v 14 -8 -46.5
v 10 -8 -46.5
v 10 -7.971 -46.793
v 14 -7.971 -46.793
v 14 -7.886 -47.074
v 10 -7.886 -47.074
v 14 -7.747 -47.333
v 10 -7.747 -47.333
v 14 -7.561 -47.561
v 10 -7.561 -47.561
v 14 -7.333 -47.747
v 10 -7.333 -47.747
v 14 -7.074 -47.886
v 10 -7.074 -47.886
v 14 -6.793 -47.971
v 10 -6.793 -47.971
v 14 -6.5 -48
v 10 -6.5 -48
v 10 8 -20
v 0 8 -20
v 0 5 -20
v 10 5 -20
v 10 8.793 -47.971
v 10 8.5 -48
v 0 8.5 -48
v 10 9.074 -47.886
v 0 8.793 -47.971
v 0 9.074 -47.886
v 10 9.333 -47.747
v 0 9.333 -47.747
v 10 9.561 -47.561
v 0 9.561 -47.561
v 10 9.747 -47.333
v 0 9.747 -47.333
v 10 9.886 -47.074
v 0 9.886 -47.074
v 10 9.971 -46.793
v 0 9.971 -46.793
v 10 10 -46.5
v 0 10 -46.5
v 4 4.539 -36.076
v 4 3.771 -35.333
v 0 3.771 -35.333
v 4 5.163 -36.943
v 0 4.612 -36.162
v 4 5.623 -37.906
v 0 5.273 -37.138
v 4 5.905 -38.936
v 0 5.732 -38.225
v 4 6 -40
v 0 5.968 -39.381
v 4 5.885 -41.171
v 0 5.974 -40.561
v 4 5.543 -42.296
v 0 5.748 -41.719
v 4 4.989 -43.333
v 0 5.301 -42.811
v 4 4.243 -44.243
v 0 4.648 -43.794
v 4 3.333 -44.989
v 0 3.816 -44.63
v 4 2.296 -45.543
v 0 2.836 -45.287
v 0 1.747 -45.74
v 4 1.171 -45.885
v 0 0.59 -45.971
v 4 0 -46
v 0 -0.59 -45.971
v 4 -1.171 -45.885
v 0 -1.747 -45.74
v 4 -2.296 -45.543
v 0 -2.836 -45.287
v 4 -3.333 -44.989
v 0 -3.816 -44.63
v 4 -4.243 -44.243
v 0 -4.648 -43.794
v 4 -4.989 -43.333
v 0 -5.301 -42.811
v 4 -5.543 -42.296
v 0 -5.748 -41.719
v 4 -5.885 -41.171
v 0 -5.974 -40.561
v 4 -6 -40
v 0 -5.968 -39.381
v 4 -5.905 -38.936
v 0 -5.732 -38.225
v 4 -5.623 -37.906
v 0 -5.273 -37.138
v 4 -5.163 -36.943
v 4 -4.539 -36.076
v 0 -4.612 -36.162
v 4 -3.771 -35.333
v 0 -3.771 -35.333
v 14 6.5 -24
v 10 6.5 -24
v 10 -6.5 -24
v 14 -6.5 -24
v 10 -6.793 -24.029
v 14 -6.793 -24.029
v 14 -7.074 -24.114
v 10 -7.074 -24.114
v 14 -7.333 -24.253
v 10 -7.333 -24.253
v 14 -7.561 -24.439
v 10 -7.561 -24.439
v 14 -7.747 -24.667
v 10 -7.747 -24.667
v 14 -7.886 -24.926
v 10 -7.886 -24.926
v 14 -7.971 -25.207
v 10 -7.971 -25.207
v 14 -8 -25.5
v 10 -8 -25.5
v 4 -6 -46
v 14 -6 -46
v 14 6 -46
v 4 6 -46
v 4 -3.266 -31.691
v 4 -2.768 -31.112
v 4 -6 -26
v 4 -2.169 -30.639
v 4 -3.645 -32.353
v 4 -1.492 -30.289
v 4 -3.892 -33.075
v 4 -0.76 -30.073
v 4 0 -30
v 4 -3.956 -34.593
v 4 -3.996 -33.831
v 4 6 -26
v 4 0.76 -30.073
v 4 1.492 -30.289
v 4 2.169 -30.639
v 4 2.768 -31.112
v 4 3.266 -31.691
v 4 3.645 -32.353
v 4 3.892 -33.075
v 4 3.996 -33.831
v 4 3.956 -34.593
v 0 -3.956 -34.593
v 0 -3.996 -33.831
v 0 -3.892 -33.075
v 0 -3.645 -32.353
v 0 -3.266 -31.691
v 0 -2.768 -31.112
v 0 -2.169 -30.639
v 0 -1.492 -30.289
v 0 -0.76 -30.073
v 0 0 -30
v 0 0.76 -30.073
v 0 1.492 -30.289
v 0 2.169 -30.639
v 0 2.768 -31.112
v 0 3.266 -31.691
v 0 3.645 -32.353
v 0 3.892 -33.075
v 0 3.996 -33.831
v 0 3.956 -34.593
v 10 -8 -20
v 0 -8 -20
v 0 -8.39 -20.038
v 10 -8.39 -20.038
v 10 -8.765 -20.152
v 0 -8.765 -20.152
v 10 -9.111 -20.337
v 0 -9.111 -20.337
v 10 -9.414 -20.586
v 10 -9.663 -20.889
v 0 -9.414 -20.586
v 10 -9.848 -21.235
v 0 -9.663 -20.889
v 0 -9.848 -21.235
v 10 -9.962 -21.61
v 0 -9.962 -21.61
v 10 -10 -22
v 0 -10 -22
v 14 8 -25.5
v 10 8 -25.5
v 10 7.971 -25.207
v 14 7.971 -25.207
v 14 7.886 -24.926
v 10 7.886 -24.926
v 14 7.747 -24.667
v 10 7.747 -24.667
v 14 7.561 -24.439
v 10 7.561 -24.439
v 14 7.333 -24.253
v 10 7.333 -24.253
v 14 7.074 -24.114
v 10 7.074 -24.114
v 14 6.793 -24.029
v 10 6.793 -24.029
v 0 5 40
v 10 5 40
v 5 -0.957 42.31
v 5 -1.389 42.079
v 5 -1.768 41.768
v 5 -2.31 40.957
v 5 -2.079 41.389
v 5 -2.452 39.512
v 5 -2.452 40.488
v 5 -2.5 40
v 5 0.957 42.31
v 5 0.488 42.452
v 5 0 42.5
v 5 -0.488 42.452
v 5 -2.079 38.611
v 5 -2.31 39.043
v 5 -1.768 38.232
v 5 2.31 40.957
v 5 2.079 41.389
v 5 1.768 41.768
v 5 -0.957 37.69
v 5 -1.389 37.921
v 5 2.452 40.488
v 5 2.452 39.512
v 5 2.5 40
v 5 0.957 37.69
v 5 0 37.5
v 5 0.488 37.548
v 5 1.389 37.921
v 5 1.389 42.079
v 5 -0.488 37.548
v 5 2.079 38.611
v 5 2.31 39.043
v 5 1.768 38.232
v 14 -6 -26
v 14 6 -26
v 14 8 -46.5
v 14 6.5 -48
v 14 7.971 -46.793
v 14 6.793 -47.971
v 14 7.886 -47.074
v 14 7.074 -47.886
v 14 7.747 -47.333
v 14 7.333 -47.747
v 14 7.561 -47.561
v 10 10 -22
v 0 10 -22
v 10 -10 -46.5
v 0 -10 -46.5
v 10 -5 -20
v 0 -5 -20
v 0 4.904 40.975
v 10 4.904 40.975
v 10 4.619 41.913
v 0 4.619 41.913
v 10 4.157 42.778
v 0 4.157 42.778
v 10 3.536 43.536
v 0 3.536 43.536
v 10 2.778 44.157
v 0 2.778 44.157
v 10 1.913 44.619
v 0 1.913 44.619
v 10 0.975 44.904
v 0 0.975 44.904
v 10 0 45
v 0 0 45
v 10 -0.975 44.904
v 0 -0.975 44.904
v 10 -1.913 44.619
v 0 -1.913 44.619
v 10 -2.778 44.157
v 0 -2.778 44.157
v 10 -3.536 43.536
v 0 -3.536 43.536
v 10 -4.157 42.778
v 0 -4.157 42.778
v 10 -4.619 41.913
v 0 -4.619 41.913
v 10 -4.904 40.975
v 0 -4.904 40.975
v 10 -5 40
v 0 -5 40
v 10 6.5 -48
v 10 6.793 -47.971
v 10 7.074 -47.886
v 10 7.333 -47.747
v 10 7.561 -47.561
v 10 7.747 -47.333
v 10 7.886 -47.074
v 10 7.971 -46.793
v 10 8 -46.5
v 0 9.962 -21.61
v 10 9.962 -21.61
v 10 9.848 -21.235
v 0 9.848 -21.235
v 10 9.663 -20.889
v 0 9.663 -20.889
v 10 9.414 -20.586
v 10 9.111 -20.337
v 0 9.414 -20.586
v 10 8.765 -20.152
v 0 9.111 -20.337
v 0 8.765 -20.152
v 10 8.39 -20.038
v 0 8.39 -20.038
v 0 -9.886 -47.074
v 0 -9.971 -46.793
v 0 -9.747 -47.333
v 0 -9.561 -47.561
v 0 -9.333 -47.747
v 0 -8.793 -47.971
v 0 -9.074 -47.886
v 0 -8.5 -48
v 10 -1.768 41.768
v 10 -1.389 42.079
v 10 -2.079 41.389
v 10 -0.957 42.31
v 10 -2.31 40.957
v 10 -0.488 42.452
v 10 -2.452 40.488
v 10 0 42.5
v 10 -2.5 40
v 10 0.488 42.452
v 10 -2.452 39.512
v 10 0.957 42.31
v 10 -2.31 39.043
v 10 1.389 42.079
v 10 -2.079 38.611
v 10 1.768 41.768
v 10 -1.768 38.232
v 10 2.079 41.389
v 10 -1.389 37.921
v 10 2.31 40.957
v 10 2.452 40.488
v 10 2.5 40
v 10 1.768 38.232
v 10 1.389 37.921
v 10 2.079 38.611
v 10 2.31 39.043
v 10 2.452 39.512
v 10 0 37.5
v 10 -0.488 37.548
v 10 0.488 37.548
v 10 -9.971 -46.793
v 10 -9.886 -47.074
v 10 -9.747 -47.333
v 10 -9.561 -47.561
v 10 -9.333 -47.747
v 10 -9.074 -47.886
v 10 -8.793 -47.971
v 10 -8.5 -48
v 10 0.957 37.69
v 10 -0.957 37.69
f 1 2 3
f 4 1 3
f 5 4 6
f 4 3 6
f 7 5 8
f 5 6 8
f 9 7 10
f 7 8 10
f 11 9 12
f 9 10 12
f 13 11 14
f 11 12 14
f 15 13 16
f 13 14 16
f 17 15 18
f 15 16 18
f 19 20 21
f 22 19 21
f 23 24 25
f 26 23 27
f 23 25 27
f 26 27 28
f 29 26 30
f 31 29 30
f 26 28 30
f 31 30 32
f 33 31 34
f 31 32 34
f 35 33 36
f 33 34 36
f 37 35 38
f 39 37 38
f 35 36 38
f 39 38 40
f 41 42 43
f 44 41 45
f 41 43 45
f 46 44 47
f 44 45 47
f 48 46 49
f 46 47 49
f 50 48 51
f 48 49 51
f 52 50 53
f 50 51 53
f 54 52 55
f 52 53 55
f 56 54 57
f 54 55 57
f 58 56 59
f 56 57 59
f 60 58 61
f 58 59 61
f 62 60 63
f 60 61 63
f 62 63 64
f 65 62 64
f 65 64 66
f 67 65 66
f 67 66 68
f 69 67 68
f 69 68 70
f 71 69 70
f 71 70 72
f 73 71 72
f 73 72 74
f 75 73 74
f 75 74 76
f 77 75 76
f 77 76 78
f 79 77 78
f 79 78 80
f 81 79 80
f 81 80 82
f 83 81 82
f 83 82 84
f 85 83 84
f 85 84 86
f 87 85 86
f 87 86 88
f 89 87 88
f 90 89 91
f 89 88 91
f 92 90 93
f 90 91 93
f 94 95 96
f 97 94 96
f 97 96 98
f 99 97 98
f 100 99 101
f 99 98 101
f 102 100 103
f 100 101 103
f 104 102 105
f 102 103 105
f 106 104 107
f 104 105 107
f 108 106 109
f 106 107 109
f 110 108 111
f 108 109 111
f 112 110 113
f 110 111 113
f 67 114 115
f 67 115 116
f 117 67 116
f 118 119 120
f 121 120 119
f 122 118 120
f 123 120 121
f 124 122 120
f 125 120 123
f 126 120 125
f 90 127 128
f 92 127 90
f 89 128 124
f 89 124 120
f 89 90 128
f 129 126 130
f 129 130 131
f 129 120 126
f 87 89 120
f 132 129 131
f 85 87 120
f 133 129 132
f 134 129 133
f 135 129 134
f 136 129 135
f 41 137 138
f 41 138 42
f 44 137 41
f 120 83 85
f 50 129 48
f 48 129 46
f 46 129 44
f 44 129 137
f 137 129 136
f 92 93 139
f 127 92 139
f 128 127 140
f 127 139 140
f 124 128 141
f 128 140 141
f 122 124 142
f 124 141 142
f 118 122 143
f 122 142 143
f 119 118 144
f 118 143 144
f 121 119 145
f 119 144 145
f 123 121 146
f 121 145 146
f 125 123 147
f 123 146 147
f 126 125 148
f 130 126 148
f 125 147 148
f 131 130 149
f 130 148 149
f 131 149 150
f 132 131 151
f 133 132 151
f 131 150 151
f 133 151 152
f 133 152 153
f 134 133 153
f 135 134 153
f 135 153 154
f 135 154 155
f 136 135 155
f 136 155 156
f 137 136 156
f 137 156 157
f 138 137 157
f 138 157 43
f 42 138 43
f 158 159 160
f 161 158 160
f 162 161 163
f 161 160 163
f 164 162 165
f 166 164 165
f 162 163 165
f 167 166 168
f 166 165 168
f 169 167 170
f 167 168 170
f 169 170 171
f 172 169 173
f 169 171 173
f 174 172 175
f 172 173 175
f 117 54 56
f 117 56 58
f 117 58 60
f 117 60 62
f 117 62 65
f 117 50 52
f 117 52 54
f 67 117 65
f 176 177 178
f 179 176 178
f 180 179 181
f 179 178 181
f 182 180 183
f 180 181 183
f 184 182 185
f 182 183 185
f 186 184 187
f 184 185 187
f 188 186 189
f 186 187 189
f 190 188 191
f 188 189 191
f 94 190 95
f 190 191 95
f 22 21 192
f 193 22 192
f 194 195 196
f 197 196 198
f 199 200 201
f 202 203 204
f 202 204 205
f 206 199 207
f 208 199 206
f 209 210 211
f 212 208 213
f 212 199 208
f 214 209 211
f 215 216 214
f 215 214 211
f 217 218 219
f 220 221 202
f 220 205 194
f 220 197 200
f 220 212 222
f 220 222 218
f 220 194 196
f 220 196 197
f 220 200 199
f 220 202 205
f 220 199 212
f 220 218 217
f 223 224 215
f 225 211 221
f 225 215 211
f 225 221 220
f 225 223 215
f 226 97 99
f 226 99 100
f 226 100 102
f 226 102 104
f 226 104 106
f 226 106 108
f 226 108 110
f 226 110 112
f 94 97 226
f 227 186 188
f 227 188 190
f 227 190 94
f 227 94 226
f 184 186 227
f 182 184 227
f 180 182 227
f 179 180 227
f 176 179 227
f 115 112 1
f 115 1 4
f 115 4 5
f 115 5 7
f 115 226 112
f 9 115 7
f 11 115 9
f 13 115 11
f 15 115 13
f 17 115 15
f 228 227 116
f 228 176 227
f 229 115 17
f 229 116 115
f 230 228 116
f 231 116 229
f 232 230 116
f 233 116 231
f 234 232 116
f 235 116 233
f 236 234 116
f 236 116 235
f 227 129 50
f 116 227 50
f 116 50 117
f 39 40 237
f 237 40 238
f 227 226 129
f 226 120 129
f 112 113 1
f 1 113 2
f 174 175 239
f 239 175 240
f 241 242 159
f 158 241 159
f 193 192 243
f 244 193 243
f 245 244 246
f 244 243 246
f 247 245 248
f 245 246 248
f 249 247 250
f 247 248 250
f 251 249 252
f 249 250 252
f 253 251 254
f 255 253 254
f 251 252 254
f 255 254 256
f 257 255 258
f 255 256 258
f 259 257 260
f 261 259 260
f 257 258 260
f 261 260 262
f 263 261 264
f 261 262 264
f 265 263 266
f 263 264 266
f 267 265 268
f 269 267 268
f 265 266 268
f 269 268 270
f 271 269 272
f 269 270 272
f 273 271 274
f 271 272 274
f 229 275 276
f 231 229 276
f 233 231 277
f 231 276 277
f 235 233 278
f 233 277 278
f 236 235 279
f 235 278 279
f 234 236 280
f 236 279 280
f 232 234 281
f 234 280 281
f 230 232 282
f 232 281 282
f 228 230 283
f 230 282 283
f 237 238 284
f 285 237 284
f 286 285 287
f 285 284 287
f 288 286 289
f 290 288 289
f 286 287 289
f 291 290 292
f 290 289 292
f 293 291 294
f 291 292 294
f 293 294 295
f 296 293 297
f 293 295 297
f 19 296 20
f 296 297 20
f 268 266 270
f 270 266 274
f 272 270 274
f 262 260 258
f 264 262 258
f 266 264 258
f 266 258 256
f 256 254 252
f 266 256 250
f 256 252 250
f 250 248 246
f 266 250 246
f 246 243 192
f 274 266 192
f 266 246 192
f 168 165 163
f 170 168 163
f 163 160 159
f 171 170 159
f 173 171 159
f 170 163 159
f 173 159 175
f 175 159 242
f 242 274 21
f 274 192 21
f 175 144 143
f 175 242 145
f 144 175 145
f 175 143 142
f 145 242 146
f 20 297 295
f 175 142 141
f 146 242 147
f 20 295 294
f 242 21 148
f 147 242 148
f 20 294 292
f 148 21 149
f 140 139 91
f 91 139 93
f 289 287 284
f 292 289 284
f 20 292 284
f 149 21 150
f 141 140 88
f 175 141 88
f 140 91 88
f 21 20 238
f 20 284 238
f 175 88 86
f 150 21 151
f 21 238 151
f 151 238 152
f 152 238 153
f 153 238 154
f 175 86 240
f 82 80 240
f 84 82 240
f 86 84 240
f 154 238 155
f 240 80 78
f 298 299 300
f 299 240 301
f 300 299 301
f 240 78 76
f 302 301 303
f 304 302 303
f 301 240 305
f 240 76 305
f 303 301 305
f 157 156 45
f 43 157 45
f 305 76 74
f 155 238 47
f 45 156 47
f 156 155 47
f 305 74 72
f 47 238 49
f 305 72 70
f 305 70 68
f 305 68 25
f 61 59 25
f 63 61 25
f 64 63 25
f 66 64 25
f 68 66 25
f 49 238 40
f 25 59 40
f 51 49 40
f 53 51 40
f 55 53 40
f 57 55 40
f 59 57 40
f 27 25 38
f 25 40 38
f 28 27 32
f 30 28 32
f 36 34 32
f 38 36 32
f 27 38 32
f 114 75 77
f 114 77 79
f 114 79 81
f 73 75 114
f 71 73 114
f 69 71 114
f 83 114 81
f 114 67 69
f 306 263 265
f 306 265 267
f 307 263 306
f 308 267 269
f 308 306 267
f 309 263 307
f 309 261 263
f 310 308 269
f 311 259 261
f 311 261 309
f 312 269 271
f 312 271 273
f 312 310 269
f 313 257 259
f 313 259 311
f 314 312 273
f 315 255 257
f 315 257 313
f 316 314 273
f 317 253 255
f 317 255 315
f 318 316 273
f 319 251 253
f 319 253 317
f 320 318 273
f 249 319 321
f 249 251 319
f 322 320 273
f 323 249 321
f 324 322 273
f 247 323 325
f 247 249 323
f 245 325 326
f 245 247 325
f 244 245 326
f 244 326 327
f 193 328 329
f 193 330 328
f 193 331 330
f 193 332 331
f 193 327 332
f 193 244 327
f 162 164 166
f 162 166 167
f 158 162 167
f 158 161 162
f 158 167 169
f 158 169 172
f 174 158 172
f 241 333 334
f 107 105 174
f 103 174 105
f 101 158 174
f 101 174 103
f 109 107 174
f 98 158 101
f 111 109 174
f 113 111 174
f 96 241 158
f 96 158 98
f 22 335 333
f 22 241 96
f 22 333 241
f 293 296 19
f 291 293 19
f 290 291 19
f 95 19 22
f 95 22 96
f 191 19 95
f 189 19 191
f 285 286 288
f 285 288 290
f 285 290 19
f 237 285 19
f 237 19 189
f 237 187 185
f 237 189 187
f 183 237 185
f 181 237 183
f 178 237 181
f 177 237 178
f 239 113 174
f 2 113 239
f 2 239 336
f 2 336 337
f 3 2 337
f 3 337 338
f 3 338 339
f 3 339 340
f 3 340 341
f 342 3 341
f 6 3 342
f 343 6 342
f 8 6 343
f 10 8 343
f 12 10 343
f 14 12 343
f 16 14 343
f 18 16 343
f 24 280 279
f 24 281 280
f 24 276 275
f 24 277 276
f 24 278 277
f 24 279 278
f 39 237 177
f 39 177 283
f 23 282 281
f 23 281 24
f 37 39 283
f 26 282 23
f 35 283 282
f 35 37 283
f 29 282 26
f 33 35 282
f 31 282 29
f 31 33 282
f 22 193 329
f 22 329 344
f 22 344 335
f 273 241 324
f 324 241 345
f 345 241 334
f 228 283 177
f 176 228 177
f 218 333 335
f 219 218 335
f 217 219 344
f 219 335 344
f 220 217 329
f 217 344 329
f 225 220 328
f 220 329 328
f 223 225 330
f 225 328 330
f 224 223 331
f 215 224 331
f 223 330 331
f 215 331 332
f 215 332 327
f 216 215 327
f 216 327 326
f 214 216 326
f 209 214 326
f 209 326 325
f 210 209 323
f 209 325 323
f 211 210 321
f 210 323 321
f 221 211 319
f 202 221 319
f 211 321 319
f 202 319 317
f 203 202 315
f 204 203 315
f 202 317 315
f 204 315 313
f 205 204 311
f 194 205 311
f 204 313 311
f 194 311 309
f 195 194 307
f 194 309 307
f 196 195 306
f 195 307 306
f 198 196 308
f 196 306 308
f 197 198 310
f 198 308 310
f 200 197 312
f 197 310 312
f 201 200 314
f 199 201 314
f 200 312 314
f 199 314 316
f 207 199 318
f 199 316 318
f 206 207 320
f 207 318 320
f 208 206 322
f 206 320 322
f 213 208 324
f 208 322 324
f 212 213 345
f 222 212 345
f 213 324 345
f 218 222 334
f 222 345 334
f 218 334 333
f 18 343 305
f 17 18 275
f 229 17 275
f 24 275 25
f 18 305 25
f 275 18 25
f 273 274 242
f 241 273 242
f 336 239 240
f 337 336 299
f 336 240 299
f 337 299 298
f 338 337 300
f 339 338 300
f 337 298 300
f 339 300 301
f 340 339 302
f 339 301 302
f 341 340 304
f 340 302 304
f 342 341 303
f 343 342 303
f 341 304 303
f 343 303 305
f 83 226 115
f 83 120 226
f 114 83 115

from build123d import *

# Parameters (mm, degrees)
BOSS_EXTRU_1_DEPTH           = 10
ESQUISSE3_R                  = 2.5
ENL_V_MAT_EXTRU_1_DEPTH      = 5
ENL_V_MAT_EXTRU_3_DEPTH      = 51.039984013
ENL_V_MAT_EXTRU_3_DEPTH_BACK = 51.039984013
ESQUISSE6_W                  = 20
ESQUISSE6_H                  = 12
ENL_V_MAT_EXTRU_4_DEPTH      = 6
ESQUISSE7_W                  = 20
ESQUISSE7_H                  = 12
BOSS_EXTRU_4_DEPTH           = 4


with BuildPart() as part:
    # Esquisse1 → Boss.-Extru.1 (new body)
    with BuildSketch(Plane(origin=(0, 0, 0), x_dir=(0, 0, -1), z_dir=(1, 0, 0))):
        with BuildLine():
            Line((0, 5), (-40, 5))
            ThreePointArc((-40, 5), (-45, 0), (-40, -5))
            Line((-40, -5), (0, -5))
            Line((0, -5), (20, -5))
            Line((20, -5), (20, -8))
            ThreePointArc((20, -8), (20.585786438, -9.414213562), (22, -10))
            Line((22, -10), (40, -10))
            Line((40, -10), (46.5, -10))
            ThreePointArc((46.5, -10), (47.560660172, -9.560660172), (48, -8.5))
            Line((48, -8.5), (48, 8.5))
            ThreePointArc((48, 8.5), (47.560660172, 9.560660172), (46.5, 10))
            Line((46.5, 10), (40, 10))
            Line((40, 10), (22, 10))
            ThreePointArc((22, 10), (20.585786438, 9.414213562), (20, 8))
            Line((20, 8), (20, 5))
            Line((20, 5), (0, 5))
        make_face()
    extrude(amount=BOSS_EXTRU_1_DEPTH)

    # Esquisse3 → Enlèv. mat.-Extru.1 (cut)
    with BuildSketch(Plane(origin=(10, 0, 0), x_dir=(0, 0, -1), z_dir=(1, 0, 0))):
        with Locations((-40, 0)):
            Circle(ESQUISSE3_R)
    extrude(amount=-ENL_V_MAT_EXTRU_1_DEPTH, mode=Mode.SUBTRACT)

    # Esquisse4 → Enlèv. mat.-Extru.3 (cut, two sides: drawn at the far end of the back side and taken through both)
    with BuildSketch(Plane(origin=(10, 0, 0), x_dir=(0, 0, -1), z_dir=(1, 0, 0)).offset(-ENL_V_MAT_EXTRU_3_DEPTH_BACK)):
        with BuildLine():
            ThreePointArc((35.333333333, 3.771236166), (46, 0), (35.333333333, -3.771236166))
            ThreePointArc((35.333333333, -3.771236166), (30, 0), (35.333333333, 3.771236166))
        make_face()
    extrude(amount=ENL_V_MAT_EXTRU_3_DEPTH + ENL_V_MAT_EXTRU_3_DEPTH_BACK, mode=Mode.SUBTRACT)

    # Esquisse6 → Enlèv. mat.-Extru.4 (cut)
    with BuildSketch(Plane(origin=(10, 0, 0), x_dir=(0, 0, -1), z_dir=(1, 0, 0))):
        with Locations((36, 0)):
            Rectangle(ESQUISSE6_W, ESQUISSE6_H)
    extrude(amount=-ENL_V_MAT_EXTRU_4_DEPTH, mode=Mode.SUBTRACT)

    # Esquisse7 → Boss.-Extru.4 (add)
    with BuildSketch(Plane(origin=(10, 0, 0), x_dir=(0, 0, -1), z_dir=(1, 0, 0))):
        with BuildLine():
            ThreePointArc((25.5, 8), (24.439339828, 7.560660172), (24, 6.5))
            Line((24, 6.5), (24, -6.5))
            ThreePointArc((24, -6.5), (24.439339828, -7.560660172), (25.5, -8))
            Line((25.5, -8), (46.5, -8))
            ThreePointArc((46.5, -8), (47.560660172, -7.560660172), (48, -6.5))
            Line((48, -6.5), (48, 6.5))
            ThreePointArc((48, 6.5), (47.560660172, 7.560660172), (46.5, 8))
            Line((46.5, 8), (25.5, 8))
        make_face()
        with Locations((36, 0)):
            Rectangle(ESQUISSE7_W, ESQUISSE7_H, mode=Mode.SUBTRACT)
    extrude(amount=BOSS_EXTRU_4_DEPTH)


solid = part.part
